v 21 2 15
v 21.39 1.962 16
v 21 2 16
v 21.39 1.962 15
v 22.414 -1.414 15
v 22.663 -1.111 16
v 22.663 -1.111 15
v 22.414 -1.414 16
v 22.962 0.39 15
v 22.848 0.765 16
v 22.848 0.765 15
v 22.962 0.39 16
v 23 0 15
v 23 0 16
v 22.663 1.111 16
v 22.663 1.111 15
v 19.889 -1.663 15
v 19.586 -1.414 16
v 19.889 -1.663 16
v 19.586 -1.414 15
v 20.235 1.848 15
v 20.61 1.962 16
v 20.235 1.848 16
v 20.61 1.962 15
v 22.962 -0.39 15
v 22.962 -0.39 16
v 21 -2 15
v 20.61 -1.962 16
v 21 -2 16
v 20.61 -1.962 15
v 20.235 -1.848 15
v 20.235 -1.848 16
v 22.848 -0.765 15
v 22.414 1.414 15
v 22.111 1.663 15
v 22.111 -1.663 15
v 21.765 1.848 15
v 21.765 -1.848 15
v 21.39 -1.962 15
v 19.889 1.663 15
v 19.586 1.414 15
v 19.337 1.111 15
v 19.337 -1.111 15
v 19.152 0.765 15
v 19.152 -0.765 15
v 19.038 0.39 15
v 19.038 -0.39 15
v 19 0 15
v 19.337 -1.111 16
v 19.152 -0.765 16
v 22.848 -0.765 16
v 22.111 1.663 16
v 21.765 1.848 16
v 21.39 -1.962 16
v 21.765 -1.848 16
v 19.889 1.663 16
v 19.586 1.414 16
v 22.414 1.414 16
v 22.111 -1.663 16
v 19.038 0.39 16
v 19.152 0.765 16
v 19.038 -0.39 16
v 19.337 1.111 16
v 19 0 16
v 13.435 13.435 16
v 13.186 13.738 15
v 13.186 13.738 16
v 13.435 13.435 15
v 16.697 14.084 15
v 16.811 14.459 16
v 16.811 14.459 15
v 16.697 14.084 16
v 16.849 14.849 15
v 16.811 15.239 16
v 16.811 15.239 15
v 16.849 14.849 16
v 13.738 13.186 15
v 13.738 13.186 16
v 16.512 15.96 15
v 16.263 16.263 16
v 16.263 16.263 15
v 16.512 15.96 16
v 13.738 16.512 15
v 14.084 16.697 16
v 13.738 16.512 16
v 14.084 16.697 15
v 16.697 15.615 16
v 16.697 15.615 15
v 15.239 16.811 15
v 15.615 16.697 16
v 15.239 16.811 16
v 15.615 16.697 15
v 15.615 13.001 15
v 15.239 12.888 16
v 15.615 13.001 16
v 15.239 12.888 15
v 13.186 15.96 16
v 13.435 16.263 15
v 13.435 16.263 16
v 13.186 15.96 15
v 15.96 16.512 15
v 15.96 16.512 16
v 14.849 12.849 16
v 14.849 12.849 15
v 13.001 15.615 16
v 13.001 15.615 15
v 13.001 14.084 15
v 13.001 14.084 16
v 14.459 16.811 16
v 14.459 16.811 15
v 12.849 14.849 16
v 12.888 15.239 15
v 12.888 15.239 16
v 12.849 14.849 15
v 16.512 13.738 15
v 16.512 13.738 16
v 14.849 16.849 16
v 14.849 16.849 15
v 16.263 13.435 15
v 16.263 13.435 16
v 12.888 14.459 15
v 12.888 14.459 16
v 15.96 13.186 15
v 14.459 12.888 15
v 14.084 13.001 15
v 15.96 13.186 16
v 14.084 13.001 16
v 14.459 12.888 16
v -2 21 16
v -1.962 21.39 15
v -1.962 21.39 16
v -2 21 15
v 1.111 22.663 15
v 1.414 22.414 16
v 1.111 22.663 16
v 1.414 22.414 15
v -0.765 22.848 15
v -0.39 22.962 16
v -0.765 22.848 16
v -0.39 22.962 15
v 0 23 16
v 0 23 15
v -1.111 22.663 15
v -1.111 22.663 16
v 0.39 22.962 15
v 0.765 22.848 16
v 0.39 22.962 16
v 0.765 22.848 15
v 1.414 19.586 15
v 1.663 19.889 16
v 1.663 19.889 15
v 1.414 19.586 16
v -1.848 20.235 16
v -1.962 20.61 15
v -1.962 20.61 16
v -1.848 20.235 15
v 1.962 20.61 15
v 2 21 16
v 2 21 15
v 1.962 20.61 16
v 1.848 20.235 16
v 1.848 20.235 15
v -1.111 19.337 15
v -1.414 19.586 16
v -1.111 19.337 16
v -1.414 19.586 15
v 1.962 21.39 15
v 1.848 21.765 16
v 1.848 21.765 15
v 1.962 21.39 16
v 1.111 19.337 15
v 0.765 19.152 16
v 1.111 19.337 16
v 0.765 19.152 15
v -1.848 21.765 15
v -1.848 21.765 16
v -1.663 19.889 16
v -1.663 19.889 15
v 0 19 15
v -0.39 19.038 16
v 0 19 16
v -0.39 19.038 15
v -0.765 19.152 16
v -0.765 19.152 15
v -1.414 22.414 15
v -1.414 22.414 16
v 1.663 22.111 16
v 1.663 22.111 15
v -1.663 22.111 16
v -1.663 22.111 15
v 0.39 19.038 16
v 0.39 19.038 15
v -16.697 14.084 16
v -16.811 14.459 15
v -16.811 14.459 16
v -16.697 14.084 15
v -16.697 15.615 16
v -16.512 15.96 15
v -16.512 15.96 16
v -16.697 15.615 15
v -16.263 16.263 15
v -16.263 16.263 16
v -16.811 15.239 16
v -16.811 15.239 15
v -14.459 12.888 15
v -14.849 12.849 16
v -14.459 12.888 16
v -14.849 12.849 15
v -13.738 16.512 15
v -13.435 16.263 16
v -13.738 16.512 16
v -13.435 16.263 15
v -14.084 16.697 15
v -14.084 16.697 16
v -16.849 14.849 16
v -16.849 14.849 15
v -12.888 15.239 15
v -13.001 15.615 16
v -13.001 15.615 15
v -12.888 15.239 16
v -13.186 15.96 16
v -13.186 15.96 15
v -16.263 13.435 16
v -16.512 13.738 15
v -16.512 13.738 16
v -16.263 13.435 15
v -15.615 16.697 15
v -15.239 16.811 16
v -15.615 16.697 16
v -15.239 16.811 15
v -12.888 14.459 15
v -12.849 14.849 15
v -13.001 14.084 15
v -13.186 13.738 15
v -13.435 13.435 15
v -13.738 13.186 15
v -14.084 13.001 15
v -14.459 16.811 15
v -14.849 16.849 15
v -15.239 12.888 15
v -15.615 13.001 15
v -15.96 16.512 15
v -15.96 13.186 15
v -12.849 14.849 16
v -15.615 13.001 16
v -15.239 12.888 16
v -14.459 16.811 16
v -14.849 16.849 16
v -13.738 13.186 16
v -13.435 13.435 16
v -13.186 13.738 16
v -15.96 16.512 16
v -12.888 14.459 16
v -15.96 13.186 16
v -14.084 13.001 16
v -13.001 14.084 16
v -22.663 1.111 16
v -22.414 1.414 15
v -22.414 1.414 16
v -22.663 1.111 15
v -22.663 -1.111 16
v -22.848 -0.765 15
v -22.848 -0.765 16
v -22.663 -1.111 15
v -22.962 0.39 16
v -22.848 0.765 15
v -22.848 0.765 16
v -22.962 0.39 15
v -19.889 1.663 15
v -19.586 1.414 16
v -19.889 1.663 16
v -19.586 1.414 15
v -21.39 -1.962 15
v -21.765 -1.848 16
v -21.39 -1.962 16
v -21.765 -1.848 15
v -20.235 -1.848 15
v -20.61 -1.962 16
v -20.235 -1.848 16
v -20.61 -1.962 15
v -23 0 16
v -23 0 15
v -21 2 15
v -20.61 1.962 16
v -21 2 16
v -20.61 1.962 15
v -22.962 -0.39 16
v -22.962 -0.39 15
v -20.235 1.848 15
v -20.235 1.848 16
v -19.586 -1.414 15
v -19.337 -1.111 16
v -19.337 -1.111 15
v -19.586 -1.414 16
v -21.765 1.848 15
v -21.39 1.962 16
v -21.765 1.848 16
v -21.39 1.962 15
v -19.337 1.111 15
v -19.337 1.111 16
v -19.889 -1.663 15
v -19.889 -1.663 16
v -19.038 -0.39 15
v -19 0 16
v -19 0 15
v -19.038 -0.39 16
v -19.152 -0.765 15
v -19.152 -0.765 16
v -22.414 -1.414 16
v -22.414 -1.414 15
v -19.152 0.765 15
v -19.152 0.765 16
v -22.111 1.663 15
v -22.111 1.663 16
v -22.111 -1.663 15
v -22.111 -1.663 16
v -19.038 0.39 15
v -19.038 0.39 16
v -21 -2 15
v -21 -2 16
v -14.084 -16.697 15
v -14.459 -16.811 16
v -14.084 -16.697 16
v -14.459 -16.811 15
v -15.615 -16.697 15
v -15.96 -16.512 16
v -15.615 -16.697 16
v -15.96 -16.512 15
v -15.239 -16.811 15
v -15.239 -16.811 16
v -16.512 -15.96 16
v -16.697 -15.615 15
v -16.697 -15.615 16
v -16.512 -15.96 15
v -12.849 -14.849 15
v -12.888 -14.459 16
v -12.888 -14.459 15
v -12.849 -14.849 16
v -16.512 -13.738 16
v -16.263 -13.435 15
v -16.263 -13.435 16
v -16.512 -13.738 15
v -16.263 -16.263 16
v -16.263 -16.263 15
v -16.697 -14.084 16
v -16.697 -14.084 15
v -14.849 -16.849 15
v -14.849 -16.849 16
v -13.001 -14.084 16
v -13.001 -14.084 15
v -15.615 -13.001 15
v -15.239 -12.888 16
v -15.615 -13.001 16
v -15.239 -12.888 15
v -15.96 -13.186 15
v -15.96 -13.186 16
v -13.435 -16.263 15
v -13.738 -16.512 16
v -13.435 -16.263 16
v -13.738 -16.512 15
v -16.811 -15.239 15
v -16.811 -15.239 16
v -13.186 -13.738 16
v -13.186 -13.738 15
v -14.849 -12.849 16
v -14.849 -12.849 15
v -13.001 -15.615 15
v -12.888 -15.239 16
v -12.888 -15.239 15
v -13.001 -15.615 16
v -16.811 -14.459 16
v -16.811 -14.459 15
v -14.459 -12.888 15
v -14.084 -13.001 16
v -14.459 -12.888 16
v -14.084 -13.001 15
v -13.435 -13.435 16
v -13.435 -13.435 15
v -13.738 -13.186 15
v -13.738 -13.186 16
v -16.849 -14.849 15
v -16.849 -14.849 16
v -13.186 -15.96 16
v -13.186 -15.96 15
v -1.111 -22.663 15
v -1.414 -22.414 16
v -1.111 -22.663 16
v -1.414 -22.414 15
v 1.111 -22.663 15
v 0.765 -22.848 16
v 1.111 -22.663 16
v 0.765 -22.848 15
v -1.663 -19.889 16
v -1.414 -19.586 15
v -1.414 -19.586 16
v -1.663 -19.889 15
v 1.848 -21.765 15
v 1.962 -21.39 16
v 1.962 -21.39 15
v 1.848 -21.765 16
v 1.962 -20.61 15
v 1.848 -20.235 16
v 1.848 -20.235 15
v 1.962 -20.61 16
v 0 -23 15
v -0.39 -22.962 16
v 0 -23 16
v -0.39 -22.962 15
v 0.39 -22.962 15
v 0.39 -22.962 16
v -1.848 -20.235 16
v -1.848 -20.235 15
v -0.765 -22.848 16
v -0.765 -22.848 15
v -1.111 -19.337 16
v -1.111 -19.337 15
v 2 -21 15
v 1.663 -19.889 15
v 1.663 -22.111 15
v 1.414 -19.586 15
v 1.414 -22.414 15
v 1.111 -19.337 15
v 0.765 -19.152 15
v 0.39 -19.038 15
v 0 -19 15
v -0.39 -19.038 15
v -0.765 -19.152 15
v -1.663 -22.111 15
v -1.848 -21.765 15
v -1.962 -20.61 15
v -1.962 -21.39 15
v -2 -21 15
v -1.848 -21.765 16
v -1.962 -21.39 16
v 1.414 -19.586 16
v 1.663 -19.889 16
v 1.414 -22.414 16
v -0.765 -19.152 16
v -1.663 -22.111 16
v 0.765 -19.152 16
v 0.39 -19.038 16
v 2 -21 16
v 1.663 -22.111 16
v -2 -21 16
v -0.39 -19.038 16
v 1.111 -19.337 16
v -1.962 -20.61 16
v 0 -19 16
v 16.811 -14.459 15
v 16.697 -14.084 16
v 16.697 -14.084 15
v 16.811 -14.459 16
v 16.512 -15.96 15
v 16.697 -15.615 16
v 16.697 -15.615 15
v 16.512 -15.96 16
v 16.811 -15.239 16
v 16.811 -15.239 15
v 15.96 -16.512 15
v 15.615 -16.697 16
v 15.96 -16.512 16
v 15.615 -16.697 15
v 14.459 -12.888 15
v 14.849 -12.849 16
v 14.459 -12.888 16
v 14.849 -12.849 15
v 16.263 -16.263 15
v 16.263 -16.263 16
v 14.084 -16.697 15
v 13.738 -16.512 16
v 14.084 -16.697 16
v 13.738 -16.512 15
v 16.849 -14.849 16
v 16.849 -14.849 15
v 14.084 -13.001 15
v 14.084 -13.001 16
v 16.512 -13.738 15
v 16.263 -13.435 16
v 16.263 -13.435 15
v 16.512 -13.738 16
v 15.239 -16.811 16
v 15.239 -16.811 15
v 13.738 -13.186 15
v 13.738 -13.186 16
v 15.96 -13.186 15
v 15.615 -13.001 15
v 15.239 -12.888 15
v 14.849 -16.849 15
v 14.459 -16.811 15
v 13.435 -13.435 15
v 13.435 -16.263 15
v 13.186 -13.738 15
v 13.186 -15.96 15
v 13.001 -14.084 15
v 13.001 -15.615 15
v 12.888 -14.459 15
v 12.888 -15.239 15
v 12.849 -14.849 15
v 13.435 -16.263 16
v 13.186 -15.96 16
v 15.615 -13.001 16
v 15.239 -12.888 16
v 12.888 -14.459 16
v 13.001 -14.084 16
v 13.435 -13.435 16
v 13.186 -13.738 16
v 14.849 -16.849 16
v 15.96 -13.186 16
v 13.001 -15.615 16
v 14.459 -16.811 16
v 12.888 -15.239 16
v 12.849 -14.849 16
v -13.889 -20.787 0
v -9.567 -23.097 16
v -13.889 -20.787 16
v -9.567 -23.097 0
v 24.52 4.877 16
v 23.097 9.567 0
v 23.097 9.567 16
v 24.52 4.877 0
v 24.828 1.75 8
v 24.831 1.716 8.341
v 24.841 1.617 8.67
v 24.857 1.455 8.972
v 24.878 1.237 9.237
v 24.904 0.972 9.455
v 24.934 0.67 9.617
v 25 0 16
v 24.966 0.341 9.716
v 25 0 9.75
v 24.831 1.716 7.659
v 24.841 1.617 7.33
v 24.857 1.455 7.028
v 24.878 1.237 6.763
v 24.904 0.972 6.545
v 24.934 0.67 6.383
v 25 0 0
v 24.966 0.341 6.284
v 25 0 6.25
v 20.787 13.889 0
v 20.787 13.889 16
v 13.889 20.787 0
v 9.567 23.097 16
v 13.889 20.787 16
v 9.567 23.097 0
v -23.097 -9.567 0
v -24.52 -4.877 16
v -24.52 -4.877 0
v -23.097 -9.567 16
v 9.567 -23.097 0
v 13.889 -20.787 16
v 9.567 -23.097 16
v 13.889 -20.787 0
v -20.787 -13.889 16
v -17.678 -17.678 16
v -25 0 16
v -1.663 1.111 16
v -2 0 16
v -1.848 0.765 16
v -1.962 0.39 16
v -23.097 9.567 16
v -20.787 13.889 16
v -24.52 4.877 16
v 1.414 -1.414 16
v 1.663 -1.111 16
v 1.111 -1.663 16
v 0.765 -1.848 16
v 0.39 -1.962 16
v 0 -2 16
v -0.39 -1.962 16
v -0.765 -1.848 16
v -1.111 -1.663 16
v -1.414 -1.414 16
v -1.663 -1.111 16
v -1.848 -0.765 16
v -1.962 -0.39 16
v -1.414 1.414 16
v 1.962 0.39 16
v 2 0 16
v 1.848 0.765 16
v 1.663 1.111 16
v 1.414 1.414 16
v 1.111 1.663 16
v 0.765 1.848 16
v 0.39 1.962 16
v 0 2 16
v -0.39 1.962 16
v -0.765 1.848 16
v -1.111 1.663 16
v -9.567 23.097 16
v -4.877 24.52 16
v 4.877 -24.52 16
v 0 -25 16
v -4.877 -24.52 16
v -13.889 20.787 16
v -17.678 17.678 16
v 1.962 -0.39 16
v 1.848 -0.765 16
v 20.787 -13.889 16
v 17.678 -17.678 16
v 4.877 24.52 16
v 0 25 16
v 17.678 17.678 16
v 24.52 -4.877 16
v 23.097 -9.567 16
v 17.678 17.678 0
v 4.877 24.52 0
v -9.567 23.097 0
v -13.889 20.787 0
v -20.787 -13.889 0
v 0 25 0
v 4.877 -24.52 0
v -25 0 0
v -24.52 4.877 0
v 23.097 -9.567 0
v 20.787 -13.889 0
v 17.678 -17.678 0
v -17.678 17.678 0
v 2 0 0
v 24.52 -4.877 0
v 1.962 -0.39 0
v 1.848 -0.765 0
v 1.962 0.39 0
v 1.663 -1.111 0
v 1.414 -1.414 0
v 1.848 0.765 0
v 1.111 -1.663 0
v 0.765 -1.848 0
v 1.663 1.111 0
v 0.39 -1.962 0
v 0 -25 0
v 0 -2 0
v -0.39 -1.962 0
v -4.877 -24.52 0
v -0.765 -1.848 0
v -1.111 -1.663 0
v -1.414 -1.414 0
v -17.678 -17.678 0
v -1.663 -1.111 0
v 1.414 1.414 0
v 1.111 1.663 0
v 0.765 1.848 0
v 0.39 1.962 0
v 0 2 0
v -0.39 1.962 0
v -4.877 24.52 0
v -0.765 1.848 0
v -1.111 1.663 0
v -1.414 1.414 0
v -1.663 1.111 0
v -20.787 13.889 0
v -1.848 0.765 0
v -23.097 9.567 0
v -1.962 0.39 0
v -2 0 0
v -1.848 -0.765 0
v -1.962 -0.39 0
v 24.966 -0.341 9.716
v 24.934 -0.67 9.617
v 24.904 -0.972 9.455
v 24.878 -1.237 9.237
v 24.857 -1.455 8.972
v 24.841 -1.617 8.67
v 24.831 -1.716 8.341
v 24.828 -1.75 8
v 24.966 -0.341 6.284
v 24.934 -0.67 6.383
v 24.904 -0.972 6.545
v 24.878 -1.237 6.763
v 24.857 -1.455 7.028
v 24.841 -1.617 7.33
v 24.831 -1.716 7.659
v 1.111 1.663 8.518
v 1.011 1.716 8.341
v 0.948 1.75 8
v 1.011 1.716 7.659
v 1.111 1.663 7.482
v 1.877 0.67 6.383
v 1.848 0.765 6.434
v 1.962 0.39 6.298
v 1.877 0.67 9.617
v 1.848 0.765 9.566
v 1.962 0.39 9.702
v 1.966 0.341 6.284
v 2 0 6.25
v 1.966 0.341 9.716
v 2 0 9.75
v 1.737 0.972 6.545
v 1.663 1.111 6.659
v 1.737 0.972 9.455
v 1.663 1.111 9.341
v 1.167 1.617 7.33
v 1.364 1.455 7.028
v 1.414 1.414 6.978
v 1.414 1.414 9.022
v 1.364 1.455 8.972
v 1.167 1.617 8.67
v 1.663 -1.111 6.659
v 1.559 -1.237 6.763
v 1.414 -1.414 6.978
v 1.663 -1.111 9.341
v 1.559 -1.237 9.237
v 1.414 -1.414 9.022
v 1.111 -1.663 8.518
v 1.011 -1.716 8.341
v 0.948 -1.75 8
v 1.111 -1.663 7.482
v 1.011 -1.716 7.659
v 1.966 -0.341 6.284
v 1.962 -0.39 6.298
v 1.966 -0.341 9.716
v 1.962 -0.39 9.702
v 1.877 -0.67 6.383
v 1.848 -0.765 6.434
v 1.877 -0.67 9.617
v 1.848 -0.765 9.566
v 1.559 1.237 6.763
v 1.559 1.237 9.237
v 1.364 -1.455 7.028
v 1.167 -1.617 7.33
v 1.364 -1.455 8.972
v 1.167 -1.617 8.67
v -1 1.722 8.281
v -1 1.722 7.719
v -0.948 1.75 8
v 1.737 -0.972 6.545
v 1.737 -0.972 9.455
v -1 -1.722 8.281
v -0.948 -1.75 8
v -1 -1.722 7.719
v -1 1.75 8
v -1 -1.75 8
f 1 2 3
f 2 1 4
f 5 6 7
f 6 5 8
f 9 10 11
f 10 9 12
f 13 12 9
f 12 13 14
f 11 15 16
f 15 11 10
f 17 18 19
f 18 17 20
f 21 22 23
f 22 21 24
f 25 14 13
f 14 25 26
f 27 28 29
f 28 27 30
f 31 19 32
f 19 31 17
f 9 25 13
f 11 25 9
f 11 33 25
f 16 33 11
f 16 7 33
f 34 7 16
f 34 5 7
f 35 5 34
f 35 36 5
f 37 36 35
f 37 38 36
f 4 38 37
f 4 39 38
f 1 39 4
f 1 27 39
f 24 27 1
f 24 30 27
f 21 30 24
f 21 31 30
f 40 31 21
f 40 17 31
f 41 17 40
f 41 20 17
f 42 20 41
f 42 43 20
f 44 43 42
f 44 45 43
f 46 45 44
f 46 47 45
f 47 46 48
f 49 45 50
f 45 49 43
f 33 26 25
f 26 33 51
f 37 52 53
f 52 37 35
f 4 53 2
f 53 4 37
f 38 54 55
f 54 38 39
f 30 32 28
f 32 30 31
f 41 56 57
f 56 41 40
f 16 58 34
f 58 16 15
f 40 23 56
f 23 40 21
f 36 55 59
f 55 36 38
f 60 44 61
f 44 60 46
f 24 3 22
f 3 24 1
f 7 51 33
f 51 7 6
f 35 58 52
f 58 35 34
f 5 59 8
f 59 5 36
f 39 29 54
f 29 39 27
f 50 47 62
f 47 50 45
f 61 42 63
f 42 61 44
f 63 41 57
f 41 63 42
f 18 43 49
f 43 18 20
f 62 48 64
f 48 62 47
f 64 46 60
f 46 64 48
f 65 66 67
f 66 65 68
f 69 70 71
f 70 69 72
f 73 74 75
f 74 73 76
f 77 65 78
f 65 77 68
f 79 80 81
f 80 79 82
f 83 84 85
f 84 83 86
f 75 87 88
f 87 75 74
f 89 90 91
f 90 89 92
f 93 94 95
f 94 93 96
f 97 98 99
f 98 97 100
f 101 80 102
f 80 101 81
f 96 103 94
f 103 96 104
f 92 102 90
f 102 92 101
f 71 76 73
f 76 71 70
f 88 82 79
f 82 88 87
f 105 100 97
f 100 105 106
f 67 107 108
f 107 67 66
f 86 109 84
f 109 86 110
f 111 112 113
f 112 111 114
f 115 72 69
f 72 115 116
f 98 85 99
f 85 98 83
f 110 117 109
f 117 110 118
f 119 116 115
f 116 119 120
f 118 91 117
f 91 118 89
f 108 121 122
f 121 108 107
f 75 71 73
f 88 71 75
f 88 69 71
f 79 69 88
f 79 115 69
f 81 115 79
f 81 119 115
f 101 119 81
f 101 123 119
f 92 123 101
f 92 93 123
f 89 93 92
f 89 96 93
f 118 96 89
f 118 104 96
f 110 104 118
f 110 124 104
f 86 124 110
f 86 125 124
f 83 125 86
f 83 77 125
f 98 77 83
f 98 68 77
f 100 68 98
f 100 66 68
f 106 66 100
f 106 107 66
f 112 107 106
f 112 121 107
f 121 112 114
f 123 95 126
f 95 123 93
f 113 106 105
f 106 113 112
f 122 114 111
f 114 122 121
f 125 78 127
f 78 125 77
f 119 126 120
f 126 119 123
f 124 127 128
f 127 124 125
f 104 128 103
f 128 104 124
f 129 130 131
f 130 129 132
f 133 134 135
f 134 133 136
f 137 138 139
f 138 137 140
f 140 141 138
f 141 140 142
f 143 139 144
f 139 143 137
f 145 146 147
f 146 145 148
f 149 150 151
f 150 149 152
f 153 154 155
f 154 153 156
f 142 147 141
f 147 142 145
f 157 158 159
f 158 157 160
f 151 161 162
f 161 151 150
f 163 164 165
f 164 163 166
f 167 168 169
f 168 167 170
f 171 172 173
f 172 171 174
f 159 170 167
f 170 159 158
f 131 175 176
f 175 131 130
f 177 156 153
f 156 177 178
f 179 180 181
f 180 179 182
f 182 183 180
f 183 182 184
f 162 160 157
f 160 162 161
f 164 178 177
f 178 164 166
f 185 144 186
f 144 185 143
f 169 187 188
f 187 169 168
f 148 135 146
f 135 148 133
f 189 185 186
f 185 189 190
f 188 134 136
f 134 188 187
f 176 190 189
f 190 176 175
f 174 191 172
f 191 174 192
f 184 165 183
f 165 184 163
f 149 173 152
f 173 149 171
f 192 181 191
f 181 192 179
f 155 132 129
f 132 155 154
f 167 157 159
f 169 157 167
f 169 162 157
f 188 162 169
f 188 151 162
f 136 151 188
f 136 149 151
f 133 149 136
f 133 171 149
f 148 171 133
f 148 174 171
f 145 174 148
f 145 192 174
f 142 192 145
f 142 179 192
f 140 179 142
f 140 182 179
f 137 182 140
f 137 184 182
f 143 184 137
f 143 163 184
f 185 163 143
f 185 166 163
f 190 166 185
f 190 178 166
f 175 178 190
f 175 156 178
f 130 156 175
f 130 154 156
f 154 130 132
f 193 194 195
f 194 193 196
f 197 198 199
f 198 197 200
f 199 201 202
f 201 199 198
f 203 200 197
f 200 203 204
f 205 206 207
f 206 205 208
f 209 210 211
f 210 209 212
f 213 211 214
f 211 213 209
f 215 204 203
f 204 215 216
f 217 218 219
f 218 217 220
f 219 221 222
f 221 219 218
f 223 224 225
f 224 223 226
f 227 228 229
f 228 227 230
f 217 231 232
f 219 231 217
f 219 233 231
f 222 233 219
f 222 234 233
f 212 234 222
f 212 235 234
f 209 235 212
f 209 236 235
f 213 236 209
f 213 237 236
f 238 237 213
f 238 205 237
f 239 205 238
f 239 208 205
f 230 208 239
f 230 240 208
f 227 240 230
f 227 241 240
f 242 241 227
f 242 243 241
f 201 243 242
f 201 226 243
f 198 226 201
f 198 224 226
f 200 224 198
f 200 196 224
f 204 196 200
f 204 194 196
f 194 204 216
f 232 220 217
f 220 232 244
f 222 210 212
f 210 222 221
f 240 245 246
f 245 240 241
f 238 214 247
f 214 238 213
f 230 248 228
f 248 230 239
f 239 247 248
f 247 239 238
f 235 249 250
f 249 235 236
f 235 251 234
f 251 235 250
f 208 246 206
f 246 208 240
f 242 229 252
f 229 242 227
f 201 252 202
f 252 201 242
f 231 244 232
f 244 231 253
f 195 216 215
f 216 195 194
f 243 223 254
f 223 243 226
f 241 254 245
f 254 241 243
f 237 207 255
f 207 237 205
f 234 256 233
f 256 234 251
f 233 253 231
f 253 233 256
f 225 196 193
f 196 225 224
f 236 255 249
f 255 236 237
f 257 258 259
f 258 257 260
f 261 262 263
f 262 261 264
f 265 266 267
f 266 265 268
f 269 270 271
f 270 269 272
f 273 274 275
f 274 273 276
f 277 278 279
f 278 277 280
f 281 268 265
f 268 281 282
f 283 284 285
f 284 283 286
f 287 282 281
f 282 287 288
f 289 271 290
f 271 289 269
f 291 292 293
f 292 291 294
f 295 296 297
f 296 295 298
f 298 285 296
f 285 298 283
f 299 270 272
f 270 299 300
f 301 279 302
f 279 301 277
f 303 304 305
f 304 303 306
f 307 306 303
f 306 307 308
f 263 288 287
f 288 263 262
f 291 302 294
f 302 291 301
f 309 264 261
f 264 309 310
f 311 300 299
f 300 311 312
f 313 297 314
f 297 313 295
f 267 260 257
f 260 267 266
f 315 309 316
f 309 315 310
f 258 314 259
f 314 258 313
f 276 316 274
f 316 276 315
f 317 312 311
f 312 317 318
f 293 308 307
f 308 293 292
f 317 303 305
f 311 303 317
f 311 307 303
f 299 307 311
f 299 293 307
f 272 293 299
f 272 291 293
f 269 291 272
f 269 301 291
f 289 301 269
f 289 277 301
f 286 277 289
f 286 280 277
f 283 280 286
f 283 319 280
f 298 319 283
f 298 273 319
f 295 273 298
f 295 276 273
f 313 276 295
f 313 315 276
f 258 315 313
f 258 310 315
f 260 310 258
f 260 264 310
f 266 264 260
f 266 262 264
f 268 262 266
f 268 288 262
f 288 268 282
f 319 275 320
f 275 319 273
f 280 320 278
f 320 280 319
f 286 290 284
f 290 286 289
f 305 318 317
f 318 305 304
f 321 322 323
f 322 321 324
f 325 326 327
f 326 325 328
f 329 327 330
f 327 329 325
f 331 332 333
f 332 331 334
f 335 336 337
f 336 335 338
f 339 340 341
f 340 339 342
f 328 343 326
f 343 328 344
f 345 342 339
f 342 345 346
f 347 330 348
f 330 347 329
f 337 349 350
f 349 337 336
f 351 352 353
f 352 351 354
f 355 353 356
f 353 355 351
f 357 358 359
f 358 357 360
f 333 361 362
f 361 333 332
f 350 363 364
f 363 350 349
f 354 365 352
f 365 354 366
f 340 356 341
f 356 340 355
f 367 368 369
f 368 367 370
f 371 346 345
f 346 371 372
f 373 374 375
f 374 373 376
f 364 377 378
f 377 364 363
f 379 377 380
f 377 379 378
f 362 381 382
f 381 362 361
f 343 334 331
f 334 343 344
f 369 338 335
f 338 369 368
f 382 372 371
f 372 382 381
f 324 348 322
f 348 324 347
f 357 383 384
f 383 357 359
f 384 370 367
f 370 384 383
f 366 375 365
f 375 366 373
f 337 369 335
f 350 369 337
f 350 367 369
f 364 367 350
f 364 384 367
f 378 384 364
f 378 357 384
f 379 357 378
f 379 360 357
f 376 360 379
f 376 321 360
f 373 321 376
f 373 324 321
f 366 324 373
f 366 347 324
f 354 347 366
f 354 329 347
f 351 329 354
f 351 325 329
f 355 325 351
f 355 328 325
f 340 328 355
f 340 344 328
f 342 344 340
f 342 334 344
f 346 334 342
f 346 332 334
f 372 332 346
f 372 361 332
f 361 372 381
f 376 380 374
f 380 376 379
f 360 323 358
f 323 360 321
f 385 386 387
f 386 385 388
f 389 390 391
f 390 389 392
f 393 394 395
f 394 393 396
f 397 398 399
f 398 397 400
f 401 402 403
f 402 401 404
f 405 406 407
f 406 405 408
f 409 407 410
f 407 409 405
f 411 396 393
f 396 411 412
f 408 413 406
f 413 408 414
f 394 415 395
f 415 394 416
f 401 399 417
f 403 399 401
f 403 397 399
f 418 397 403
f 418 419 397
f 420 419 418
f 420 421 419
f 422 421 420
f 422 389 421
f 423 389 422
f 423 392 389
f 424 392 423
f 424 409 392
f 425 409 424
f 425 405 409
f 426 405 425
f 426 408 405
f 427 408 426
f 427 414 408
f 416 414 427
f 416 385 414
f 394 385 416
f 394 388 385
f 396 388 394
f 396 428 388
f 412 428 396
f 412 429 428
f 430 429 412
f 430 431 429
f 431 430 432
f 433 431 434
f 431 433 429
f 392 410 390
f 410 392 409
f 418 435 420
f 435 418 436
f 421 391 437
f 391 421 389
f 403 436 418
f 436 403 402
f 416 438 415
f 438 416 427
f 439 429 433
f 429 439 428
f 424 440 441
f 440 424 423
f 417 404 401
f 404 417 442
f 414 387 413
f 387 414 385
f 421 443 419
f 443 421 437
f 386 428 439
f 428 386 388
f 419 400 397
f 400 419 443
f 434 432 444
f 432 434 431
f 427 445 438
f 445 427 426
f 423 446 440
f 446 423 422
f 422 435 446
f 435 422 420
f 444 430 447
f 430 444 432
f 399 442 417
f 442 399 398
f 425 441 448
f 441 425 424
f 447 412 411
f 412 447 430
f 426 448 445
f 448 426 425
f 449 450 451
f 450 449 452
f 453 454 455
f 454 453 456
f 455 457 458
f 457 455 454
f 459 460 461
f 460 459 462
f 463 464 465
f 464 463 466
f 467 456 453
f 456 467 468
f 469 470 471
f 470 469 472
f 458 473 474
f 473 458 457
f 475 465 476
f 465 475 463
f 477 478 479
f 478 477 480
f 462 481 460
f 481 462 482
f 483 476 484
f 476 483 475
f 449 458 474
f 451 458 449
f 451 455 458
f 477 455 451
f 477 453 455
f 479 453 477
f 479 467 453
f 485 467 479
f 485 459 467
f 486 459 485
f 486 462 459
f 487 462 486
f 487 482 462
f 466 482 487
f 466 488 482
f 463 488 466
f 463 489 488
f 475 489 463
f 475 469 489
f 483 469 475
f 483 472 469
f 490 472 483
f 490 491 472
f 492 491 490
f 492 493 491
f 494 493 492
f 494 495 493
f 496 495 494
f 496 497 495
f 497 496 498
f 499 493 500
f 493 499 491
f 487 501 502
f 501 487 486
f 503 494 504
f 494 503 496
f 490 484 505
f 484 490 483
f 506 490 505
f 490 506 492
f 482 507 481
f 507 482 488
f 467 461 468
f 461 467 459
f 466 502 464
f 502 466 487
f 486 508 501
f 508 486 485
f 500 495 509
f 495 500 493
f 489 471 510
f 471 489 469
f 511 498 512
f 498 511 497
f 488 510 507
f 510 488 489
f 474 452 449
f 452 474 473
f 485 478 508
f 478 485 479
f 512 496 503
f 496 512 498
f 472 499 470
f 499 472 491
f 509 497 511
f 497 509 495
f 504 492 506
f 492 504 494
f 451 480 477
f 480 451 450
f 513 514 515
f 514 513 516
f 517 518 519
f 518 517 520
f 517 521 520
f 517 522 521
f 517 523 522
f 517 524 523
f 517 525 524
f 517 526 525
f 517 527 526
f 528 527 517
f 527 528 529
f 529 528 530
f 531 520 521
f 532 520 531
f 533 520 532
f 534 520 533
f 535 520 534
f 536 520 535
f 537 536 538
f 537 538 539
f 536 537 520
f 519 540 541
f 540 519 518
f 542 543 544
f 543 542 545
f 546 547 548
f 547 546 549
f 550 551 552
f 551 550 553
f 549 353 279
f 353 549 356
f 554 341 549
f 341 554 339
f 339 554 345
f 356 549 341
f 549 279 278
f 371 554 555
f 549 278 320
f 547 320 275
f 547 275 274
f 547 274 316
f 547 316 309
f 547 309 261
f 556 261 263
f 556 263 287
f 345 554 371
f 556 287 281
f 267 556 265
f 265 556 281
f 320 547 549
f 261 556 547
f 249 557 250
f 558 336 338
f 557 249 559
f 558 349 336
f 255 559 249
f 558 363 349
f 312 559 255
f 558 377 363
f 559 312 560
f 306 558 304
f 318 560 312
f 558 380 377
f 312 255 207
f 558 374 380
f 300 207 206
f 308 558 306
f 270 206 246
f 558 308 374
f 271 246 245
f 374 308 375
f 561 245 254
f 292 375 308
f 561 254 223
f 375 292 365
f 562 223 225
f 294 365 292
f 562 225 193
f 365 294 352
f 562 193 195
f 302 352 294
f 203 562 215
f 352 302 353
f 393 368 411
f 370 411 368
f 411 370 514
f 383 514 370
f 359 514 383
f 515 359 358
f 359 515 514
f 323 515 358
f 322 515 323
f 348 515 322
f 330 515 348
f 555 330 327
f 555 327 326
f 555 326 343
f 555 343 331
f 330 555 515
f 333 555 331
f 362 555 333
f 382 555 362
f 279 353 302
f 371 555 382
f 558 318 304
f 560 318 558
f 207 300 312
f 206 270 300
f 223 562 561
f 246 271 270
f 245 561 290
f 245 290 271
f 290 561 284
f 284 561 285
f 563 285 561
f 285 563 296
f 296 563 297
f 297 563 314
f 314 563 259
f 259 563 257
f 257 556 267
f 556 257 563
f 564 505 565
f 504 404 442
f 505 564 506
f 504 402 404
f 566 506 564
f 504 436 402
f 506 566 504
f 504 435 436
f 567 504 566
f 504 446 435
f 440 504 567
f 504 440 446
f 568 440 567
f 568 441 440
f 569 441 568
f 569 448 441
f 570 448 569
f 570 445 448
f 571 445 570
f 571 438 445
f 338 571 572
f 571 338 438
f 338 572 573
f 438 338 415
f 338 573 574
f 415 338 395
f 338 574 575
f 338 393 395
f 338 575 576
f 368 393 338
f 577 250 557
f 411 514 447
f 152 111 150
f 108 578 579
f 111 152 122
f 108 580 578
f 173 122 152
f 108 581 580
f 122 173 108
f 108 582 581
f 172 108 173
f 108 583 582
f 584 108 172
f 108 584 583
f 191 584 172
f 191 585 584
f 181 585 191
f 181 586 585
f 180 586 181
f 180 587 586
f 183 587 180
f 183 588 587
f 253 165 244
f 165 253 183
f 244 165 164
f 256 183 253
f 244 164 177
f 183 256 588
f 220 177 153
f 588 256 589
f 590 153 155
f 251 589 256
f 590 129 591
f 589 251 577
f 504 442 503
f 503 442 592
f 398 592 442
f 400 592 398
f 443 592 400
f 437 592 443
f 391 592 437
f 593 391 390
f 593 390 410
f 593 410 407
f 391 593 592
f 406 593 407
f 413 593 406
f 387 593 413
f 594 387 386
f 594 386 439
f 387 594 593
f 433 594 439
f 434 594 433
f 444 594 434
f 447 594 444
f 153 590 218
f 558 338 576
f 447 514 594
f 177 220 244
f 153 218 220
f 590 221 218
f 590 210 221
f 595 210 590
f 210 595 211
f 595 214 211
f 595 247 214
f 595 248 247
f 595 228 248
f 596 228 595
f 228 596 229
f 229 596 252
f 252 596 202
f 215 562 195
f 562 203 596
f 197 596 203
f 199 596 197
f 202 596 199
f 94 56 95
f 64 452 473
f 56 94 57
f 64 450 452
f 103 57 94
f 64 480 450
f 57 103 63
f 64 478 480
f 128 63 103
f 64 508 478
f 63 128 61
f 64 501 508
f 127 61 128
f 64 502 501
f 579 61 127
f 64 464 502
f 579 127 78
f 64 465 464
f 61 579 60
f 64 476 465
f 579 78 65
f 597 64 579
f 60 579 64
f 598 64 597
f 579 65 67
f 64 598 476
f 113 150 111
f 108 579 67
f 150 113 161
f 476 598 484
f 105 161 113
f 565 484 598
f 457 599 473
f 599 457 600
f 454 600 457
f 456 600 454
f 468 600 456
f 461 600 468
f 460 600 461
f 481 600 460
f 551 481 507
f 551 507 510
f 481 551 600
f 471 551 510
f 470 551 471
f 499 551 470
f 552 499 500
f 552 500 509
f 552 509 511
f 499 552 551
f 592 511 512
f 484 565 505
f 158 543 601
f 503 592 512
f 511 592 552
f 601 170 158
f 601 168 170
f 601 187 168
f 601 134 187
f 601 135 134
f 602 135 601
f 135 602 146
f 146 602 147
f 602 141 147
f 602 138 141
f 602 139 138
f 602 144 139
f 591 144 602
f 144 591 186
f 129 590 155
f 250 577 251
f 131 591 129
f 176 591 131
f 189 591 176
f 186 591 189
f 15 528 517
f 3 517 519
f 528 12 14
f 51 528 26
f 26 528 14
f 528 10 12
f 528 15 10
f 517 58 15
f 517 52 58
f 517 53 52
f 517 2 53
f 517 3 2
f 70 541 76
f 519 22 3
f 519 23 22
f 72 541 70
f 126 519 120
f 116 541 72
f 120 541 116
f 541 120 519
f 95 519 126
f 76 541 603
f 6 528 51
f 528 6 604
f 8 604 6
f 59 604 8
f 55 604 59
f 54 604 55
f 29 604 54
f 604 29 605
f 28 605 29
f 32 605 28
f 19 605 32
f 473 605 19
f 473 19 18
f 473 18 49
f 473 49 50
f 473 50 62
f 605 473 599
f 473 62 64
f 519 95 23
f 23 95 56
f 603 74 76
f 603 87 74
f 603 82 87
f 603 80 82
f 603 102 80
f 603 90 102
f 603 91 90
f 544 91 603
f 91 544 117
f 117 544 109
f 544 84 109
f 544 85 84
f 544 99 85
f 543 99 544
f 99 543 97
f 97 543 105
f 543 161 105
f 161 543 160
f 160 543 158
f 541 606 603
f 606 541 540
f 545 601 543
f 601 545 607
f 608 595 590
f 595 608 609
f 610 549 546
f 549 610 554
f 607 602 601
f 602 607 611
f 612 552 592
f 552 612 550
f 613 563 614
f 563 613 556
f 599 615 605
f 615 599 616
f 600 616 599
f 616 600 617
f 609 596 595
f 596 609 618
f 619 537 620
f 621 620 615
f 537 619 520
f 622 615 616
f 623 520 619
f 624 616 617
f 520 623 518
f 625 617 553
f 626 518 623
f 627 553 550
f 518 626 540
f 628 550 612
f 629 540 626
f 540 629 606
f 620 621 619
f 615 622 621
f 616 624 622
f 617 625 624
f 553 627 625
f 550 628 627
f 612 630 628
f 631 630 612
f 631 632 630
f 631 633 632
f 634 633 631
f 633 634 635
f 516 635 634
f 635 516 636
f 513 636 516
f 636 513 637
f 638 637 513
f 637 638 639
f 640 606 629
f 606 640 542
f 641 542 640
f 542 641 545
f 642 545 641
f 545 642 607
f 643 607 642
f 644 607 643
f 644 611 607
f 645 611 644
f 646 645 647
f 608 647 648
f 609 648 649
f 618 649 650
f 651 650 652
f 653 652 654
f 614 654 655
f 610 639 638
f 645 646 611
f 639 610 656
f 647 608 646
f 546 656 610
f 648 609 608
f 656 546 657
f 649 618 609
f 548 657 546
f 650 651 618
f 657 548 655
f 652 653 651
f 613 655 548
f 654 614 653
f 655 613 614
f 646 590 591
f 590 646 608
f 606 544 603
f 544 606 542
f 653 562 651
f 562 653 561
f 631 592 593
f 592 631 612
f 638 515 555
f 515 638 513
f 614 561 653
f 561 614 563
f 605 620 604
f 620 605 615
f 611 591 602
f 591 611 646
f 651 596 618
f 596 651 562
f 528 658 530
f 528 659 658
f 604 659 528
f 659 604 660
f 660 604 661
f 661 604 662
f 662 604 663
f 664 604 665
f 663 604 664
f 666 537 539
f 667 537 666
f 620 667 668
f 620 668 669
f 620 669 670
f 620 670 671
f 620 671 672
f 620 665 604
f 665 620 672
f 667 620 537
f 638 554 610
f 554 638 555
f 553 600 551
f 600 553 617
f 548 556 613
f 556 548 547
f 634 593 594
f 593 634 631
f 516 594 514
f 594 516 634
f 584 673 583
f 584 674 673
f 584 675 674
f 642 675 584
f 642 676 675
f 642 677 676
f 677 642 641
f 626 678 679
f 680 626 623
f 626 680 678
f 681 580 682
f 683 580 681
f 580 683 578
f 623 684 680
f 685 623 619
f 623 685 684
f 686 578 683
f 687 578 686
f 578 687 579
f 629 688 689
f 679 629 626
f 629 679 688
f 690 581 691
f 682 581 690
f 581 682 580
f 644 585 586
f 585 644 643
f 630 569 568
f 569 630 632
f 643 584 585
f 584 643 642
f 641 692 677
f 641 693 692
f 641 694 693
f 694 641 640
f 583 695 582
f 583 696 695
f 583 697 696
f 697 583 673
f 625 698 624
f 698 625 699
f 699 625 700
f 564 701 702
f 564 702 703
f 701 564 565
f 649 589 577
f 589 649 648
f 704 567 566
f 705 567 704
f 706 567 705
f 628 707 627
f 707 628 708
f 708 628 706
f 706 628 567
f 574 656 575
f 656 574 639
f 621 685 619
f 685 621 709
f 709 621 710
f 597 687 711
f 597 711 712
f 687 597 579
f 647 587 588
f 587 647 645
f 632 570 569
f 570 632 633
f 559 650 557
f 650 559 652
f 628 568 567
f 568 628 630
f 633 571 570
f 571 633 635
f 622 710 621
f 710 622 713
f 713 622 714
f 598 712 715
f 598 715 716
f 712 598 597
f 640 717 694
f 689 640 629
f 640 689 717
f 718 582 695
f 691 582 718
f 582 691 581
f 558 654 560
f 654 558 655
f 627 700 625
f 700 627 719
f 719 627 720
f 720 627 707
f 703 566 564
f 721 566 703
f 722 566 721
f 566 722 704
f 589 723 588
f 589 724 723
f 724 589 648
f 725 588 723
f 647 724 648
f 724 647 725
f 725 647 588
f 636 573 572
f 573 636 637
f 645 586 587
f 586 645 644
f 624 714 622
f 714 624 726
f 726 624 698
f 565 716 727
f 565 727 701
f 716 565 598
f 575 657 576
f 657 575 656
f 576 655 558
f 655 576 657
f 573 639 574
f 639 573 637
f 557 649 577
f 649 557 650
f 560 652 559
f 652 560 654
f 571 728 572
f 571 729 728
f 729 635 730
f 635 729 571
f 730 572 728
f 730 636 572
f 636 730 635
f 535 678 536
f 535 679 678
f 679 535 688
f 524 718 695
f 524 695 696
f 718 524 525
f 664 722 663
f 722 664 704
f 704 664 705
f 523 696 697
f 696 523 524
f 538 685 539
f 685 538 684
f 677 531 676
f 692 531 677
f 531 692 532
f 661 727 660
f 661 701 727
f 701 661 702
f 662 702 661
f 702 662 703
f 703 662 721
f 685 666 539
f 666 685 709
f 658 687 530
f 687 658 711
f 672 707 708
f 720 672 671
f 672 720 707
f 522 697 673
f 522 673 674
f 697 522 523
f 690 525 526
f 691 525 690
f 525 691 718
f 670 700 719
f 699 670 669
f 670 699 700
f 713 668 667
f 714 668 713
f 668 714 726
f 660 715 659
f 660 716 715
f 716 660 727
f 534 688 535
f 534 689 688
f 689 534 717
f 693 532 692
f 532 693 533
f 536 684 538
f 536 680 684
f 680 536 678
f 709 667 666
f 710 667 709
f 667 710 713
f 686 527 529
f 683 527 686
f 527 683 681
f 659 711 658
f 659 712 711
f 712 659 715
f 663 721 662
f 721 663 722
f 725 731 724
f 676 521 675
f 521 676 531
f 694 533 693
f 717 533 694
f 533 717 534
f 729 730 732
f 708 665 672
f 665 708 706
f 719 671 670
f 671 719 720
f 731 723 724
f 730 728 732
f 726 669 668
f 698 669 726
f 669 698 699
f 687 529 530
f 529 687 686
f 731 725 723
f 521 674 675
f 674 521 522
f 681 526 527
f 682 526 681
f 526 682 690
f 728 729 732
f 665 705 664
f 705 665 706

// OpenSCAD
$fn = 32;

// ----------------------------------------------------------------------
// Control knob: dimpled knob
// ----------------------------------------------------------------------

// --- parameters (mm) ---
dimp_d = 4;               // finger dimple diameter
n_dimp = 8;               // number of dimples
dimp_r = 21;              // dimple ring radius
knob_d = 50;              // knob body diameter
knob_h = 16;              // knob body height
bore_d = 4;               // shaft bore diameter
set_d = 3.5;              // set screw bore diameter
fit_tol = 0.05;           // tolerance for press fits, mm
free_tol = 0.3;           // tolerance for clearance fits, mm

dimp_step = 360 / n_dimp;  // dimple angular step

difference() {
  cylinder(h = knob_h, d = knob_d);
  translate([0, 0, -1]) cylinder(h = knob_h + 2, d = bore_d);
  translate([-1, 0, knob_h / 2]) rotate([0, 90, 0])
    cylinder(h = knob_d / 2 + bore_d / 2 + 2, d = set_d);  for (i = [0 : n_dimp - 1])
    rotate([0, 0, i * dimp_step])
      translate([dimp_r, 0, knob_h - 1])
        cylinder(h = 2, d = dimp_d);
}
